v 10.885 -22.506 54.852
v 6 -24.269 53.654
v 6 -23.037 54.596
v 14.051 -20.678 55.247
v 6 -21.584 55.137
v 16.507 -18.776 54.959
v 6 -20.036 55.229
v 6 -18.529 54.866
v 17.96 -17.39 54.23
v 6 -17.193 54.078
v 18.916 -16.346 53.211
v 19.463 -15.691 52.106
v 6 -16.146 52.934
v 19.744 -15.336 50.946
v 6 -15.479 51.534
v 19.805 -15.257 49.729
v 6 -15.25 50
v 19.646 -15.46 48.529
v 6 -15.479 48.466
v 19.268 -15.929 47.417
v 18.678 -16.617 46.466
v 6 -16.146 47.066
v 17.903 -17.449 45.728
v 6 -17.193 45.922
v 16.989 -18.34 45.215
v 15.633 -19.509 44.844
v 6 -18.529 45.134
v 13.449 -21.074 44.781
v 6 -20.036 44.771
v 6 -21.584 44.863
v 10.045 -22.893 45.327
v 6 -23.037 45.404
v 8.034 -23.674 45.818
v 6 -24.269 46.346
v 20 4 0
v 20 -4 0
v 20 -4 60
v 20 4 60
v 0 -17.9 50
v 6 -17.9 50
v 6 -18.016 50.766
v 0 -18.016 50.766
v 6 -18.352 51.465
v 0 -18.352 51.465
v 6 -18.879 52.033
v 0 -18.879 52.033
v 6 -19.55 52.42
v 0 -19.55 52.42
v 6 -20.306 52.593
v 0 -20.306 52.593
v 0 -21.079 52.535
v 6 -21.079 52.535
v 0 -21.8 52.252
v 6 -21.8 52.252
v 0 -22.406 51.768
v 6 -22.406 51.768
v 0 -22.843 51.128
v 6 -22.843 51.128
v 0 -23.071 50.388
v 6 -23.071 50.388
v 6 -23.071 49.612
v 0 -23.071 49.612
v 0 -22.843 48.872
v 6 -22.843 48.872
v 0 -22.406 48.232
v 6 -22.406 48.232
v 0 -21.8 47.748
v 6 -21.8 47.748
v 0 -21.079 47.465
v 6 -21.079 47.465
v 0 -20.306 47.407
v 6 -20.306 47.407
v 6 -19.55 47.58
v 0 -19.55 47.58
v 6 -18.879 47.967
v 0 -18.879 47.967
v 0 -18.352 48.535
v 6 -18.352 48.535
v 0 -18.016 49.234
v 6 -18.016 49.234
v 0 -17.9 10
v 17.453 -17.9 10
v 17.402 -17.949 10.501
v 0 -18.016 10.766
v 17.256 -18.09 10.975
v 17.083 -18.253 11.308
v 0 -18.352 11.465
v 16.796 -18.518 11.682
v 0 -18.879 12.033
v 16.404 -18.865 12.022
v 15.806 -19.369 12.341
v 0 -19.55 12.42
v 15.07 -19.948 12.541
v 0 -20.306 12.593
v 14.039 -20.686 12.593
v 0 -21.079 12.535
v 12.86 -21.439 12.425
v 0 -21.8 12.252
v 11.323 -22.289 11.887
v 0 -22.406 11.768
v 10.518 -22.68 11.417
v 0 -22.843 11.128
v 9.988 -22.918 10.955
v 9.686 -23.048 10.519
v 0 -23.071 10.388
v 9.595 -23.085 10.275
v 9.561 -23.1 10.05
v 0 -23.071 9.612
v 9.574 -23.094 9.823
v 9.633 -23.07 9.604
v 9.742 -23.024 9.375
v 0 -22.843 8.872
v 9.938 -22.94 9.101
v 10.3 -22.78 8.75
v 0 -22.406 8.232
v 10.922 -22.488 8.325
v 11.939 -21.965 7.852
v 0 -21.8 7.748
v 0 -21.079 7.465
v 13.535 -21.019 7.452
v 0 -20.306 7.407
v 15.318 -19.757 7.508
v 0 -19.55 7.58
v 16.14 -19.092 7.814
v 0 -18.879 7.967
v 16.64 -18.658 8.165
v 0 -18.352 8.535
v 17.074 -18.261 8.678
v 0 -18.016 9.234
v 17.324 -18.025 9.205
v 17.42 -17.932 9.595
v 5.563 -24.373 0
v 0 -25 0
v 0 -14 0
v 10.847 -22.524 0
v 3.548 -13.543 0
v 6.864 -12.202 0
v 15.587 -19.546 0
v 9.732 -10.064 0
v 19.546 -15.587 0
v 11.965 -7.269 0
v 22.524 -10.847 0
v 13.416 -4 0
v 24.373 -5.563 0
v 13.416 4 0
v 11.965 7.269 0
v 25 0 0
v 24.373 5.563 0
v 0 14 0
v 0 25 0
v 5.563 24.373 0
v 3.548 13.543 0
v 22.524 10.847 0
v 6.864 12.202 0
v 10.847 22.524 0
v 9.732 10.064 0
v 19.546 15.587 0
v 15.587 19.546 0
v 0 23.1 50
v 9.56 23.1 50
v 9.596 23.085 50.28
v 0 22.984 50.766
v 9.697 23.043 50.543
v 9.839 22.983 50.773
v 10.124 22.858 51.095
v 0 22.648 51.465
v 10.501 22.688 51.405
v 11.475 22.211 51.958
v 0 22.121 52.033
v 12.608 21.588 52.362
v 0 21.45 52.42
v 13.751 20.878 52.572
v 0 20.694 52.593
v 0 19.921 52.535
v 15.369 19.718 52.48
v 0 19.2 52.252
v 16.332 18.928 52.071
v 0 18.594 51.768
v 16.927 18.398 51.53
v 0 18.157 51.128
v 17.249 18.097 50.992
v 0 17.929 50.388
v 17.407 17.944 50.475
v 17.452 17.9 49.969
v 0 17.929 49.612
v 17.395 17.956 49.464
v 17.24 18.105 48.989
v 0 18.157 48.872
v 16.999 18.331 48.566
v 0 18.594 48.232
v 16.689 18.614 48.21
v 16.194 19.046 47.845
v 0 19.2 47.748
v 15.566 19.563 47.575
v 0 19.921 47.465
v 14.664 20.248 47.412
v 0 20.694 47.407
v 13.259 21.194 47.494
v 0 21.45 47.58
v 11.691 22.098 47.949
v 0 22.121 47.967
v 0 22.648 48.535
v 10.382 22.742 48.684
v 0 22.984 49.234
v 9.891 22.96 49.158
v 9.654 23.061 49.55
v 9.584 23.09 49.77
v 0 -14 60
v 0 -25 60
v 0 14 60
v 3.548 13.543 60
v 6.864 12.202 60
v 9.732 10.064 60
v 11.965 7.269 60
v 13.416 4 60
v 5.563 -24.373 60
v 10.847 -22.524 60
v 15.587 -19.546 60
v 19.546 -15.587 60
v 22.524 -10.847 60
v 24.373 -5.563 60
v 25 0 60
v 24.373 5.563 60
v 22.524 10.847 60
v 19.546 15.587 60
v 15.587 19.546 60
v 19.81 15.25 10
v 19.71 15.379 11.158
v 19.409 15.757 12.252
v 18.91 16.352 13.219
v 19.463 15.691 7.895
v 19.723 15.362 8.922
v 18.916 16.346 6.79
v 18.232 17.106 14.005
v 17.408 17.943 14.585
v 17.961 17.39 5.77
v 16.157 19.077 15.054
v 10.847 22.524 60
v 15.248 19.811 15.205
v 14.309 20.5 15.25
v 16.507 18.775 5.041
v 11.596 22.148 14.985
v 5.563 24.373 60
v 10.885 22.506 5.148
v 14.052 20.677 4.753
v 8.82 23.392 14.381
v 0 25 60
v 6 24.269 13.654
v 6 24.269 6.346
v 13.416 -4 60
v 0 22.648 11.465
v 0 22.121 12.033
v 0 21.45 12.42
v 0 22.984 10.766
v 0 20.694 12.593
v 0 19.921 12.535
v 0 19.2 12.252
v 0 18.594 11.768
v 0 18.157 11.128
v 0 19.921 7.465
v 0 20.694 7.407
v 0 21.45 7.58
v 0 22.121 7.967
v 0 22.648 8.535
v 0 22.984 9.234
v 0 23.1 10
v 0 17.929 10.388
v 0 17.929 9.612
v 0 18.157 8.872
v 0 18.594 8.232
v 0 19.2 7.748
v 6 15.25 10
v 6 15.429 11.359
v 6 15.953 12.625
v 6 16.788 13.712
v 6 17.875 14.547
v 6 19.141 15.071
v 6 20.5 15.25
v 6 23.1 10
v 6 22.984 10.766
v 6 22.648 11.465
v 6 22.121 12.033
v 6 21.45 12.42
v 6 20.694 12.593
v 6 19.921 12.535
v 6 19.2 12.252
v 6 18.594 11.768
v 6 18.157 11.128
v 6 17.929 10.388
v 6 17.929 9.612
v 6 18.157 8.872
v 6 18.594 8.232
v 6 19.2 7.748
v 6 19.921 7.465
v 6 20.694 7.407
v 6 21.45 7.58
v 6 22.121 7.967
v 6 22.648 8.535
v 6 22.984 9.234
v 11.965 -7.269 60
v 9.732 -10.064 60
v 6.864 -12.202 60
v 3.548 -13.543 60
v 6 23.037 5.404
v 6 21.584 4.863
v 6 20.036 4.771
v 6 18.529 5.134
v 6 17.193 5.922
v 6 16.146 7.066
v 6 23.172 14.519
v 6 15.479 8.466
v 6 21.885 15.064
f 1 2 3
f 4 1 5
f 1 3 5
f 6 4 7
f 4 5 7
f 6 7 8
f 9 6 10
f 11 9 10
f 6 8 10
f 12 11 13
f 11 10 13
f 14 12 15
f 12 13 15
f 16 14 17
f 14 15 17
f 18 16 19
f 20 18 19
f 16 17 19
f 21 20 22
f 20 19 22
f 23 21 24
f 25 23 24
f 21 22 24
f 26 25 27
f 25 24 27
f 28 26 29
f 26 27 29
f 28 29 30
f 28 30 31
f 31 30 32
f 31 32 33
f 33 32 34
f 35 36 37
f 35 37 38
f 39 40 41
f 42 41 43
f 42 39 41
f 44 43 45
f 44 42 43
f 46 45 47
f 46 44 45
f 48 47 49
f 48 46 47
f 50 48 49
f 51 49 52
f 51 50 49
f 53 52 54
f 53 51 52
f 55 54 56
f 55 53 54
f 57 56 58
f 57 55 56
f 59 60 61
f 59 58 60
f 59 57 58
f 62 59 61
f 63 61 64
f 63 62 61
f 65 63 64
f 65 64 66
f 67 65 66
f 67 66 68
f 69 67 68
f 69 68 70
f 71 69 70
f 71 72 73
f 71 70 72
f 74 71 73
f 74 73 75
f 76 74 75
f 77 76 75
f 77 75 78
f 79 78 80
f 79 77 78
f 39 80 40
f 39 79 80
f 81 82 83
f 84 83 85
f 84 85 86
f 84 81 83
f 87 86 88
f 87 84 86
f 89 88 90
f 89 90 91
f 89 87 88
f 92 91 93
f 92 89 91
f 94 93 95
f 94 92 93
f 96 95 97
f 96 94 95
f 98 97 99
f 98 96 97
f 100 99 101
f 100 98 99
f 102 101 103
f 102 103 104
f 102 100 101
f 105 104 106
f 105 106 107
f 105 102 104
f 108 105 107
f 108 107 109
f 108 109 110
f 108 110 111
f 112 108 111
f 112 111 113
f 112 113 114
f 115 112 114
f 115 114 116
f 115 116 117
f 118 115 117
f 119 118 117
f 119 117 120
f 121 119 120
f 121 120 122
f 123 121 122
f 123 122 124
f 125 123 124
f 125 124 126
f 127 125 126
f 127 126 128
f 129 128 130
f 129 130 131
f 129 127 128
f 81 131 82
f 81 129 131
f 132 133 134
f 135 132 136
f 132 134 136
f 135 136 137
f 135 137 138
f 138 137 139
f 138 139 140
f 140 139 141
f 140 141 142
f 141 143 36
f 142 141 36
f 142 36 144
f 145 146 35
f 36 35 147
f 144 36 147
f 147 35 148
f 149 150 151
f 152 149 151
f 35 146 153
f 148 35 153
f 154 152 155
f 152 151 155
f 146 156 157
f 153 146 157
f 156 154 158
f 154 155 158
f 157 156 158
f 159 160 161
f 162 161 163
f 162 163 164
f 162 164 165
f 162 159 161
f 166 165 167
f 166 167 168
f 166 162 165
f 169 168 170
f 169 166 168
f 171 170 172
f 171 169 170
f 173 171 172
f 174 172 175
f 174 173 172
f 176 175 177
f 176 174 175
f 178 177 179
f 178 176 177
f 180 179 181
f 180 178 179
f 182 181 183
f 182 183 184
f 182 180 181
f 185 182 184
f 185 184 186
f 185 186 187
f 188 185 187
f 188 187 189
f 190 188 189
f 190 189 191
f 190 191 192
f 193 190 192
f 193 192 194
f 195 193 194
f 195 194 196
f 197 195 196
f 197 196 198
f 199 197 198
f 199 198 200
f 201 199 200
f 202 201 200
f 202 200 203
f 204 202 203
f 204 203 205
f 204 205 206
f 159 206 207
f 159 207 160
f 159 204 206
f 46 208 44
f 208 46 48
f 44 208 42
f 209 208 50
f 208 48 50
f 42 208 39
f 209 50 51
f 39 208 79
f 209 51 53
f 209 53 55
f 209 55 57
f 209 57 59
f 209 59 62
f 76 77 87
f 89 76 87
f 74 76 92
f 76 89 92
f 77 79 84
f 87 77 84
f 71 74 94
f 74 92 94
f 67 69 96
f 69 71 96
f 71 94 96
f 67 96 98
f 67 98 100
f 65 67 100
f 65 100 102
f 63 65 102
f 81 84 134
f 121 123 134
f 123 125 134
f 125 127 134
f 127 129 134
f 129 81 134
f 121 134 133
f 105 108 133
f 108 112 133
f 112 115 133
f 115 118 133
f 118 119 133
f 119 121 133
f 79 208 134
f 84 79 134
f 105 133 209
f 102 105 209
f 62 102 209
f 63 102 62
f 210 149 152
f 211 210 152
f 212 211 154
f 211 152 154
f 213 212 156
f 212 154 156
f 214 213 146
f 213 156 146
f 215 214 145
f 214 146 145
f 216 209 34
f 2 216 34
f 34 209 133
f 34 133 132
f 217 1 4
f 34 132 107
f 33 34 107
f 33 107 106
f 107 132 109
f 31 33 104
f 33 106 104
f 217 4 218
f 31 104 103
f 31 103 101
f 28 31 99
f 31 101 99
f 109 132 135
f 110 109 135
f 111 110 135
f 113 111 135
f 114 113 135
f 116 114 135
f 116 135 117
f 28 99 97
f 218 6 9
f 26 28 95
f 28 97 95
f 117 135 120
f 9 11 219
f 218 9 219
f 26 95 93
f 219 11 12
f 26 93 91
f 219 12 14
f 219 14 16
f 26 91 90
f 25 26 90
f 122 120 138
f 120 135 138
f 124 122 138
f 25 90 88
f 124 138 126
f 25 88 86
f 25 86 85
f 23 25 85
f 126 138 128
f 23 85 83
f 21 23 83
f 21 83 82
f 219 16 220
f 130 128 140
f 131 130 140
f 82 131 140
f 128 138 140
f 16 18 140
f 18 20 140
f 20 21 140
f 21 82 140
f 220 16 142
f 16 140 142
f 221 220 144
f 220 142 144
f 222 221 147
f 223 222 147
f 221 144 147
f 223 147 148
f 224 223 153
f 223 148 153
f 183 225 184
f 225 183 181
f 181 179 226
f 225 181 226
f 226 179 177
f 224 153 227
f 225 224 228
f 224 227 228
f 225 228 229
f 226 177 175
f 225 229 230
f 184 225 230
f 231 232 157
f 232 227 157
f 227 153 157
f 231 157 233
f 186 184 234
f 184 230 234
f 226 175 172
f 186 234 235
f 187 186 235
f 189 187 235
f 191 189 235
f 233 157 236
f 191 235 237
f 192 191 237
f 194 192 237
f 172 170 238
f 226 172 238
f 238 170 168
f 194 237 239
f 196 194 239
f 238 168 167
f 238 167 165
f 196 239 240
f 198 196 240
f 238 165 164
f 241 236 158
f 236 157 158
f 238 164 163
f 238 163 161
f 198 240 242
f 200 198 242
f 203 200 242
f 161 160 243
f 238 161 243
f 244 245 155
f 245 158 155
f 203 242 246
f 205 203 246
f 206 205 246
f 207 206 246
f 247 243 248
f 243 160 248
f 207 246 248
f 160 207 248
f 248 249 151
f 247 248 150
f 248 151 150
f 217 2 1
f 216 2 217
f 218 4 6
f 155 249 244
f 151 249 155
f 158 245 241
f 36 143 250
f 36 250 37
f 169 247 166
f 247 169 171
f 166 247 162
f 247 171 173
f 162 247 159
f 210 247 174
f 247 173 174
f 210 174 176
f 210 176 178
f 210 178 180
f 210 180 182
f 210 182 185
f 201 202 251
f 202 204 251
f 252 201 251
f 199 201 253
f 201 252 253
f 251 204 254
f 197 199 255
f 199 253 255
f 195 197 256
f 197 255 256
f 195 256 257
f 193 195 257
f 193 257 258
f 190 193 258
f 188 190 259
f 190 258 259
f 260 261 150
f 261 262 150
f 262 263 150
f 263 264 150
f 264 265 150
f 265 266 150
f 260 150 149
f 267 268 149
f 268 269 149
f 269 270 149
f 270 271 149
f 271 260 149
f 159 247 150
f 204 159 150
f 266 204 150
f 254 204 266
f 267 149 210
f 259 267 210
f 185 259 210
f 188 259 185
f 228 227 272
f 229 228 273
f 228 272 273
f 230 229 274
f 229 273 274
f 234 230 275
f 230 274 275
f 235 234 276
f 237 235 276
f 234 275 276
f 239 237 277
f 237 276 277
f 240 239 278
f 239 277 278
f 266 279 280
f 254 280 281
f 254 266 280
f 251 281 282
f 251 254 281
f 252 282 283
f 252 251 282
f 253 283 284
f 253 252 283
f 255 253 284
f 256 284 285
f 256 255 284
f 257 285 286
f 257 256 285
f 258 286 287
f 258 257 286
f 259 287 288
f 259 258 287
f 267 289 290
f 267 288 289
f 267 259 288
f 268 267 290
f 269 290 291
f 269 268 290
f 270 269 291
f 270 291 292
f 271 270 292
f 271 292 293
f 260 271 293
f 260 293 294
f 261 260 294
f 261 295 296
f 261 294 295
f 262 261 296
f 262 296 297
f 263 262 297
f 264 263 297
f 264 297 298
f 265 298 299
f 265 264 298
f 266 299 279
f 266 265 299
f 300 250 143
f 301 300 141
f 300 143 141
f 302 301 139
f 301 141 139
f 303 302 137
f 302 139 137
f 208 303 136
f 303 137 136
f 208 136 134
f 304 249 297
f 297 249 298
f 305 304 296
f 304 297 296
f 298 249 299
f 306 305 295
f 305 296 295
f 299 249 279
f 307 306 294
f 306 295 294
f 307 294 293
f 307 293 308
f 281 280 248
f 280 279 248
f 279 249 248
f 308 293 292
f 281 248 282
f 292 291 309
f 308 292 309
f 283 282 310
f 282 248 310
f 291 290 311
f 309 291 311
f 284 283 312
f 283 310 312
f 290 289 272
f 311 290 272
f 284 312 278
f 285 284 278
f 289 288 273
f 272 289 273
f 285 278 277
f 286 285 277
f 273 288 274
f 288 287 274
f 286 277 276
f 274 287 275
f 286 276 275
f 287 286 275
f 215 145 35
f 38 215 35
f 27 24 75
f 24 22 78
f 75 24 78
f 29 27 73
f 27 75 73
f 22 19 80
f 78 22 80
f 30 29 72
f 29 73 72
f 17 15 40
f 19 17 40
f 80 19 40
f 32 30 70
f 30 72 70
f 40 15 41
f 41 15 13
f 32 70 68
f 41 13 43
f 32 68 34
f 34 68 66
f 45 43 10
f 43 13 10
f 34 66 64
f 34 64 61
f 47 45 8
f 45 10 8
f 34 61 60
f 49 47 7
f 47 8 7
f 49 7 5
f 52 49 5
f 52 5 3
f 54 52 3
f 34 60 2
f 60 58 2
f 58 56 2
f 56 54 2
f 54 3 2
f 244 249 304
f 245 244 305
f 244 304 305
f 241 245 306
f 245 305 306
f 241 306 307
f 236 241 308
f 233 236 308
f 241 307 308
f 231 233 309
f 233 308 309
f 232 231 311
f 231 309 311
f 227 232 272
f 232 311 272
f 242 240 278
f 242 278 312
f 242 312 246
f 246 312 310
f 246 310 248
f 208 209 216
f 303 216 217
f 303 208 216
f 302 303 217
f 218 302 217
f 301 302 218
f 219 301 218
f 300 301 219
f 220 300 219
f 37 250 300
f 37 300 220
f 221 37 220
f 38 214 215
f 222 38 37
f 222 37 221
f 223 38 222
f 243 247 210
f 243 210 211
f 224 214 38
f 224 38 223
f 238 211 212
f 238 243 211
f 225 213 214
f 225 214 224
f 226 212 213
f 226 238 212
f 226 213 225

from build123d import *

# Parameters (mm, degrees)
F1_DEPTH = 60
F2_R     = 2.6
F3_DEPTH = 25.001
F6_DEPTH = 25
F7_W     = 8
F7_H     = 8
F8_DEPTH = 60.0010001


with BuildPart() as f1:
    # F0 (on Top) → F1 (new body)
    with BuildSketch(Plane.XY):
        with BuildLine():
            Line((0, -14), (0, -25))
            ThreePointArc((0, -25), (25, 0), (0, 25))
            Line((0, 25), (0, 14))
            ThreePointArc((0, 14), (14, 0), (0, -14))
        make_face()
    extrude(amount=F1_DEPTH)

    # F2 (on Right) → F3 (cut, through all)
    with BuildSketch(Plane.YZ):
        with Locations((-20.5, 10)):
            Circle(F2_R)
        with Locations((-20.5, 50)):
            Circle(F2_R)
        with Locations((20.5, 50)):
            Circle(F2_R)
        with Locations((20.5, 10)):
            Circle(F2_R)
    extrude(amount=F3_DEPTH, mode=Mode.SUBTRACT)

    # F5 (on offset) → F6 (cut)
    with BuildSketch(Plane(origin=(6, 0, 0), x_dir=(0, -1, 0), z_dir=(-1, 0, 0))):
        with BuildLine():
            ThreePointArc((15.25, 50), (20.5, 44.75), (25.75, 50))
            ThreePointArc((25.75, 50), (20.5, 55.25), (15.25, 50))
        make_face()
        with BuildLine():
            ThreePointArc((-15.25, 10), (-16.7876893988, 13.7123106012), (-20.5, 15.25))
            ThreePointArc((-20.5, 15.25), (-24.2123106012, 6.2876893988), (-15.25, 10))
        make_face()
    extrude(amount=-F6_DEPTH, mode=Mode.SUBTRACT)

    # F7 (on Top) → F8 (cut, through all)
    with BuildSketch(Plane.XY):
        with Locations((16, 0)):
            Rectangle(F7_W, F7_H)
    extrude(amount=F8_DEPTH, mode=Mode.SUBTRACT)


solid = f1.part
